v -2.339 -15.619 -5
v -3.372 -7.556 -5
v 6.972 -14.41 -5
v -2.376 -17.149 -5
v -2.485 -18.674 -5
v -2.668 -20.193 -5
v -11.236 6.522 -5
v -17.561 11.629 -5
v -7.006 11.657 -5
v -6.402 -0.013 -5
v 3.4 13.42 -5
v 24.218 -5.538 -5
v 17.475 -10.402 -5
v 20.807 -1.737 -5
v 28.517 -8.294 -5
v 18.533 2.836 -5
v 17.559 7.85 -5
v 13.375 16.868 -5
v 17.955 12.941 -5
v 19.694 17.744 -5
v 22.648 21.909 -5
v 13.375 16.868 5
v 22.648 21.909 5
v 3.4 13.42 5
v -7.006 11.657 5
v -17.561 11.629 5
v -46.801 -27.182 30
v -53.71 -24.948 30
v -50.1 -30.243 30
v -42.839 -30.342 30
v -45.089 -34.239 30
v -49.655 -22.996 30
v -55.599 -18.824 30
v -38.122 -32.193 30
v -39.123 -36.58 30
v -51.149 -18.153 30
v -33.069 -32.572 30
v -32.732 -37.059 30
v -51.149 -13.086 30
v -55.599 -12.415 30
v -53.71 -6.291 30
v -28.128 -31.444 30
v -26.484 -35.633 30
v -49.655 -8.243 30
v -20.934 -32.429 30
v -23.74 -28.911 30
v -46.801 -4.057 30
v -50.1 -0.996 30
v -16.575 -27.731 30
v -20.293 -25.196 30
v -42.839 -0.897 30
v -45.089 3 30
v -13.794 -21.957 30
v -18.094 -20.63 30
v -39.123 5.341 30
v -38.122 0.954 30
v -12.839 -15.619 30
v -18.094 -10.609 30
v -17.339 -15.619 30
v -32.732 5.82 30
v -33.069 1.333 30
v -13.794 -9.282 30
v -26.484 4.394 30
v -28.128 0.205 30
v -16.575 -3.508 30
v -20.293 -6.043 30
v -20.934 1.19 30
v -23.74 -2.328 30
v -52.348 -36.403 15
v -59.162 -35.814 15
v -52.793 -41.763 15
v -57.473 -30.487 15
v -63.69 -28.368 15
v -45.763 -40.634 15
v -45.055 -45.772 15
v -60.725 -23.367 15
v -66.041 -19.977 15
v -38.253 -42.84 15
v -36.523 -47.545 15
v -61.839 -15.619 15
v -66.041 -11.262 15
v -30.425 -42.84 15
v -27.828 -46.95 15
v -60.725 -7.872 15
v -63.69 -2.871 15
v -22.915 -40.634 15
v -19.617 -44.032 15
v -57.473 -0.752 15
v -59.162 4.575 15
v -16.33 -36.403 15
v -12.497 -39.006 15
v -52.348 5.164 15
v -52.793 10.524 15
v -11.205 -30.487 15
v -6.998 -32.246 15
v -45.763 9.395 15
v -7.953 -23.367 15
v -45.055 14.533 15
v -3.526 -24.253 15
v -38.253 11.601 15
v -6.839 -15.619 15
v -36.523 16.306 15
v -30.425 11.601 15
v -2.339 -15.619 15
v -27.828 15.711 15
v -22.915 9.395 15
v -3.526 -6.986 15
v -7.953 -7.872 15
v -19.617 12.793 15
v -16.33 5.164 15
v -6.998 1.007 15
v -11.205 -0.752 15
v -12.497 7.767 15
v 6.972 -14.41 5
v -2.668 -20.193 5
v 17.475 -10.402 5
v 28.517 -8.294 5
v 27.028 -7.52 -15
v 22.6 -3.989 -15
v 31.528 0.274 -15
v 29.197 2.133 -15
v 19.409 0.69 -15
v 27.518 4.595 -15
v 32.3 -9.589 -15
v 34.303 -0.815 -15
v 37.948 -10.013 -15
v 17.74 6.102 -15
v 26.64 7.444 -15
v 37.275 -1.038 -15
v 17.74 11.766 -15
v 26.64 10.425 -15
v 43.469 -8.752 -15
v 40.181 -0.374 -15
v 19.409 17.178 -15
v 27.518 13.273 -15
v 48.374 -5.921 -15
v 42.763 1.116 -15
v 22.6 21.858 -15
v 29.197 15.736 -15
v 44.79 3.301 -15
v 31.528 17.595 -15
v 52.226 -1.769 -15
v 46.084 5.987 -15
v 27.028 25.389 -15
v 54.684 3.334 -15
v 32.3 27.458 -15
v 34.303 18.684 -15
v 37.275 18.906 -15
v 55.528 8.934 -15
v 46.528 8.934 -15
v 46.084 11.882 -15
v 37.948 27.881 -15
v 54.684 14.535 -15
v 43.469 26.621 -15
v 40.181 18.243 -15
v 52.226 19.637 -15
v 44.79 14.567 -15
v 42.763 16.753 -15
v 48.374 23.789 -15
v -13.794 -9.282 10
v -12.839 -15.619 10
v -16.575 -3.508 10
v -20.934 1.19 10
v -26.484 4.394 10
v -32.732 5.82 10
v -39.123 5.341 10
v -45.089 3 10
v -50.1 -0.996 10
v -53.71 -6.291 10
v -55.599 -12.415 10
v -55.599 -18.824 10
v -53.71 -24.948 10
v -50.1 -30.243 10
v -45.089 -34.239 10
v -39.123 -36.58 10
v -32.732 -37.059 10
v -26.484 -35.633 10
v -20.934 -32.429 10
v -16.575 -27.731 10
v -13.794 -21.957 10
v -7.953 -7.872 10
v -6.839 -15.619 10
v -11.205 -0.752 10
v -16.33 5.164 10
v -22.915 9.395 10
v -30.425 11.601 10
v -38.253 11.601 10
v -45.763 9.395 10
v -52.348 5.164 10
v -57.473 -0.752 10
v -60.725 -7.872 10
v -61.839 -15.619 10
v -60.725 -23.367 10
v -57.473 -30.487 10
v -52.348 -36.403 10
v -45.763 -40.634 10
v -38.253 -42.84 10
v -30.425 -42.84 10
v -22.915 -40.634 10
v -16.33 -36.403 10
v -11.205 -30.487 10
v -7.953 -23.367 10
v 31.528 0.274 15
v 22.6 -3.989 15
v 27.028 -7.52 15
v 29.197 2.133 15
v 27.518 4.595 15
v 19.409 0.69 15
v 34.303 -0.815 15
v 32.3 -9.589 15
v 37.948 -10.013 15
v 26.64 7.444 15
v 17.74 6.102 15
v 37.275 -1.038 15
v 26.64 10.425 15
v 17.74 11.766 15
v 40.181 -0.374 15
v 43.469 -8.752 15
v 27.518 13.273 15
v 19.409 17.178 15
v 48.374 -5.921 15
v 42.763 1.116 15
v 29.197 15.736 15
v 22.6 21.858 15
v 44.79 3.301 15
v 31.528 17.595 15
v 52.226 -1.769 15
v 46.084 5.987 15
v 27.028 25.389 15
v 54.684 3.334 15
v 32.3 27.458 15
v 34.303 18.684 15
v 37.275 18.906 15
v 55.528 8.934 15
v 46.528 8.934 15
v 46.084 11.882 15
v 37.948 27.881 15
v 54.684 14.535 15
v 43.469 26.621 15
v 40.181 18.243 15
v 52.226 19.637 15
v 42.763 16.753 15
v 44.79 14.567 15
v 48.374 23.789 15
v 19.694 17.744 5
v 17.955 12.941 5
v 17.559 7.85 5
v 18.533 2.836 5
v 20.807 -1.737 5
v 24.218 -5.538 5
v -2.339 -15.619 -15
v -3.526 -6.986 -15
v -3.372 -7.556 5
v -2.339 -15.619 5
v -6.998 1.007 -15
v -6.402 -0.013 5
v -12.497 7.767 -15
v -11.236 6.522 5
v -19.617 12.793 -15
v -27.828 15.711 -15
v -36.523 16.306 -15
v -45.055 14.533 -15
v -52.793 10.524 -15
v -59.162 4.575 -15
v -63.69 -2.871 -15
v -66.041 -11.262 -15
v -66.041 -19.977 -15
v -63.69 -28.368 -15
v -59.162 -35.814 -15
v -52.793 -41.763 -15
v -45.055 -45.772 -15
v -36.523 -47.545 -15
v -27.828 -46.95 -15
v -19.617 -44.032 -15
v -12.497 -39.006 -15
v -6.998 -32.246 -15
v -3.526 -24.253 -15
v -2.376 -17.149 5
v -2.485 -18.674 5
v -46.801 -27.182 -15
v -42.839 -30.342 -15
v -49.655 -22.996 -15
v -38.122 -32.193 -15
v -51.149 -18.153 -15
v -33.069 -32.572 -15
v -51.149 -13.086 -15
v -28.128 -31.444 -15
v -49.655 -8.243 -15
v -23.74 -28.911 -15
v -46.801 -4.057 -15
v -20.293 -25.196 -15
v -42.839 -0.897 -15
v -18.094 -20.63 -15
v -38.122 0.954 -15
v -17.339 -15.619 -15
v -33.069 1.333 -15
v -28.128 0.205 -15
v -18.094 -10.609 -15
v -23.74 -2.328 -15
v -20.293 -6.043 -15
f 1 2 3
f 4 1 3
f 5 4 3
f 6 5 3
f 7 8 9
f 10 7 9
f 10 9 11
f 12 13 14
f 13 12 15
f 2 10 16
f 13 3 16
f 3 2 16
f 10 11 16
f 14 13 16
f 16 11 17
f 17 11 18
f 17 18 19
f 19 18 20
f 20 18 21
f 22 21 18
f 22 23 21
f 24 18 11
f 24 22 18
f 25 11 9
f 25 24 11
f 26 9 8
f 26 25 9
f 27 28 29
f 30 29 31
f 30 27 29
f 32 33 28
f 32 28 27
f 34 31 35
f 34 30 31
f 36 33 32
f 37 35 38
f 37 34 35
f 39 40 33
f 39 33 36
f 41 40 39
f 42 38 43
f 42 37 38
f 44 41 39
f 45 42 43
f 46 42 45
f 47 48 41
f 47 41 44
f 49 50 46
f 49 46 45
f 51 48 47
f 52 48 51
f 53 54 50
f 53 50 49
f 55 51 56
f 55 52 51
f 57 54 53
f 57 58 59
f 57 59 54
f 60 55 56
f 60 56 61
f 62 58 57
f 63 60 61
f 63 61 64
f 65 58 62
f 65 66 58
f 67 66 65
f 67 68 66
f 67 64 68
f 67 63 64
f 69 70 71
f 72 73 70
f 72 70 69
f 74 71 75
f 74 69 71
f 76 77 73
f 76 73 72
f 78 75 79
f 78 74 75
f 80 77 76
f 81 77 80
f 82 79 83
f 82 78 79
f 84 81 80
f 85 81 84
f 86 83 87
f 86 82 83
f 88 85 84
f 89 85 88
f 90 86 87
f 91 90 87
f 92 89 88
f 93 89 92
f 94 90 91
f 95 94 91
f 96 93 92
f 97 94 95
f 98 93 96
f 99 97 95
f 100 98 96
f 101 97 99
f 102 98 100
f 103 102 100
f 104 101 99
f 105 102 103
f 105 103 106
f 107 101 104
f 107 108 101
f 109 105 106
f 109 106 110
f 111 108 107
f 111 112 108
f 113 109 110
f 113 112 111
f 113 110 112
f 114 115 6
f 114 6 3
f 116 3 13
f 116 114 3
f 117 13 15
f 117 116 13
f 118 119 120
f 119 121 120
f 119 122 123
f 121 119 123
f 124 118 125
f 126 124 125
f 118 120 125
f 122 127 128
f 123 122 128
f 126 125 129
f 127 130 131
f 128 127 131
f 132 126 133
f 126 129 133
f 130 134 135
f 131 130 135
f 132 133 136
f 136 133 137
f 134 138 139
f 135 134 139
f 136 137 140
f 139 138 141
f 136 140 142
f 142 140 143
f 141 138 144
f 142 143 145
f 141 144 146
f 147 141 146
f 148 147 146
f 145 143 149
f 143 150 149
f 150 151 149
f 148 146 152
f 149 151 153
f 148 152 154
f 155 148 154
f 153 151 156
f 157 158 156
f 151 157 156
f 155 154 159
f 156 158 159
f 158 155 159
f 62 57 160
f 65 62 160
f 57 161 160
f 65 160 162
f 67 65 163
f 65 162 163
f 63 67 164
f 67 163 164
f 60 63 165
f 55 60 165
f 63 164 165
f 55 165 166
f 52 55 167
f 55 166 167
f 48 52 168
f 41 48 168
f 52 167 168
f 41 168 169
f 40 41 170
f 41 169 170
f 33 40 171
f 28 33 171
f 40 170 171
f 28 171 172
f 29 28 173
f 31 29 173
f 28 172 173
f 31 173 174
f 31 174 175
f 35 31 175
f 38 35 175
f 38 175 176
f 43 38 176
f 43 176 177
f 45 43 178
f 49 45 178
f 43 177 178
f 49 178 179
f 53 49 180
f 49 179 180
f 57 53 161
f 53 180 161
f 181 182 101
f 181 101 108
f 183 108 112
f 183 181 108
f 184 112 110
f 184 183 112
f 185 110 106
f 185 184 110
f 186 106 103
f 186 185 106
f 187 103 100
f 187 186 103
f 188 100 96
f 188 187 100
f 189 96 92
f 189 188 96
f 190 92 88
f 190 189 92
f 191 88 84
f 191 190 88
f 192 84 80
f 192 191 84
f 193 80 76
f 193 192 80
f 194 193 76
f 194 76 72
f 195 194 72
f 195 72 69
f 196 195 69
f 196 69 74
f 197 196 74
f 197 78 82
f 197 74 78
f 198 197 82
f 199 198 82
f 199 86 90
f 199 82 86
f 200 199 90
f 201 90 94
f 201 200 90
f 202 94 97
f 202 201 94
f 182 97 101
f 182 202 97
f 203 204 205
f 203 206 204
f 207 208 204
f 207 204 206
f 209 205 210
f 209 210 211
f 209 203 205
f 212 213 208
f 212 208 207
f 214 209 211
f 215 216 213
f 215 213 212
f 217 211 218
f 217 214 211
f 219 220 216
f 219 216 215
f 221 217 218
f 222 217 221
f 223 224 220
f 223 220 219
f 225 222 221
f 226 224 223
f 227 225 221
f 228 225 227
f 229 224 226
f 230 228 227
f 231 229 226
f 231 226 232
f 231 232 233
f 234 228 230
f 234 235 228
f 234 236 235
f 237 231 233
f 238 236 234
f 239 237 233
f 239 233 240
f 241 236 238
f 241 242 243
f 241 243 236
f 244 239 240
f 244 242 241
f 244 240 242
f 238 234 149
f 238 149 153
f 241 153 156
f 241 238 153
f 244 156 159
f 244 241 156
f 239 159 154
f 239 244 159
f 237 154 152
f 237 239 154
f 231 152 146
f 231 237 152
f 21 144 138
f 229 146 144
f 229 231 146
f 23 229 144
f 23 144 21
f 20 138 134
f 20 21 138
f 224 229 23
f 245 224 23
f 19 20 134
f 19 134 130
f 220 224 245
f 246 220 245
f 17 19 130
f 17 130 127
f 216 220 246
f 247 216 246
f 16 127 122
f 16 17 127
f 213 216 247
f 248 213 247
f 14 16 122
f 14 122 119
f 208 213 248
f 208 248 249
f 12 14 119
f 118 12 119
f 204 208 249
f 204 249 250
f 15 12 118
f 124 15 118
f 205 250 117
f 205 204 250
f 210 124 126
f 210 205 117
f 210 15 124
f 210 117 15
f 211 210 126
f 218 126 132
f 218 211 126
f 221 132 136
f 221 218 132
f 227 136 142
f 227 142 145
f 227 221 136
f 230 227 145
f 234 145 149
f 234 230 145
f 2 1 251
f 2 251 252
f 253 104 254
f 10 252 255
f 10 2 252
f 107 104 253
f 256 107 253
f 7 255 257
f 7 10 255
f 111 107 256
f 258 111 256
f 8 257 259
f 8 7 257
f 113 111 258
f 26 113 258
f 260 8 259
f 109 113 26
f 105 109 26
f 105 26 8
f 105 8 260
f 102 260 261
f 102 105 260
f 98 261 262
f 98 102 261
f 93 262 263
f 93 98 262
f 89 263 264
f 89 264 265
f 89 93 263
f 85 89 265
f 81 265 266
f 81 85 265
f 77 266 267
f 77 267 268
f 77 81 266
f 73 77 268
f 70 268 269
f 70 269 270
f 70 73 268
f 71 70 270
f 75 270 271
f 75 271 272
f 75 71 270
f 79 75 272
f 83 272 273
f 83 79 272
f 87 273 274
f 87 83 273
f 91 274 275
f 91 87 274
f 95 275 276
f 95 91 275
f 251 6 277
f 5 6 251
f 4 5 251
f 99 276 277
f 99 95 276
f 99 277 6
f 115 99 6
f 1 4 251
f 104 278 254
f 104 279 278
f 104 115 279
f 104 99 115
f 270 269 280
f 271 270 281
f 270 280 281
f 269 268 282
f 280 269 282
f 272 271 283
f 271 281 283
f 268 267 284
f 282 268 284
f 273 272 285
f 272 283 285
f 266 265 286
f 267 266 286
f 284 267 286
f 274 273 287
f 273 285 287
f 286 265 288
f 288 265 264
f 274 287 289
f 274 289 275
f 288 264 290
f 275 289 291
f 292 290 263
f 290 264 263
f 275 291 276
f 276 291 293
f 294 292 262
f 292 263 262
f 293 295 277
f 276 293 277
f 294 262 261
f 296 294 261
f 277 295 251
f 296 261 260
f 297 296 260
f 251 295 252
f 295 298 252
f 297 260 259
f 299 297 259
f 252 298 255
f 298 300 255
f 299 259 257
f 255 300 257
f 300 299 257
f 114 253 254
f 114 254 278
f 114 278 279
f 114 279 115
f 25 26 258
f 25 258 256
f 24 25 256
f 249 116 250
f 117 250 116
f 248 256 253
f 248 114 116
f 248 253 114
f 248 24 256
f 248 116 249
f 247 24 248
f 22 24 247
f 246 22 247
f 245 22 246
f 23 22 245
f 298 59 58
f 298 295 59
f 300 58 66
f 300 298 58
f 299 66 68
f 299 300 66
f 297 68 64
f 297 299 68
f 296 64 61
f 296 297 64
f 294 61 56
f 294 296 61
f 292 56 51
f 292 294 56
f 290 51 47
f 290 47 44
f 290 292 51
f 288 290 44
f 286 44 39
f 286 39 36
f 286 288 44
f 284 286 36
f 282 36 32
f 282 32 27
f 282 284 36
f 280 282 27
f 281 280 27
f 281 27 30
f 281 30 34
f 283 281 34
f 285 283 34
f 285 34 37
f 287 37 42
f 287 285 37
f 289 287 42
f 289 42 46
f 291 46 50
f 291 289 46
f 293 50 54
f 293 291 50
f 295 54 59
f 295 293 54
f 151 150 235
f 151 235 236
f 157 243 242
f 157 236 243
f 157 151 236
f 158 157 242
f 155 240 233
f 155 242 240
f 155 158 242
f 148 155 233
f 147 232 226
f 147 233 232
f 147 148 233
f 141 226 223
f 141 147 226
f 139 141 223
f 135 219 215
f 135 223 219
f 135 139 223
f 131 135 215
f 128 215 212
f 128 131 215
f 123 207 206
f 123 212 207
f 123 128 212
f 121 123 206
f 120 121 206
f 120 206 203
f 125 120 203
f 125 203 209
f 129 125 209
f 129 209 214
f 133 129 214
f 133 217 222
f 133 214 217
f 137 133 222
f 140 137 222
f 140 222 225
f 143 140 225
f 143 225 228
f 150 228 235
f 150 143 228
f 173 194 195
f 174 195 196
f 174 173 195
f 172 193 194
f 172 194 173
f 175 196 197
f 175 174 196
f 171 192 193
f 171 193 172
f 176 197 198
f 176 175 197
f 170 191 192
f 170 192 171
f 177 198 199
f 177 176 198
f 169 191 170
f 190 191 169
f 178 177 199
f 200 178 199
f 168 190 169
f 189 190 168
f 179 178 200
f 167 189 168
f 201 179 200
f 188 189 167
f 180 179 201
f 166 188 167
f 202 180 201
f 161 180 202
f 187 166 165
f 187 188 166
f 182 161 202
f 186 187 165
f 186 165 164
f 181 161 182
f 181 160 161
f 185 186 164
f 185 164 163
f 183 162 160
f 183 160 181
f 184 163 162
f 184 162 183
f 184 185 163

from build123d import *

# Parameters (mm, degrees)
SKETCH1_R               = 32
BOSS_EXTRUDE1_DEPTH     = 15
SKETCH1_R_2             = 19
BOSS_EXTRUDE1_2_DEPTH   = 15
BOSS_EXTRUDE2_DEPTH     = 5
CUT_EXTRUDE1_DEPTH      = 84.026980949
CUT_EXTRUDE1_DEPTH_BACK = 84.026980949
SKETCH1_4_R             = 17
SKETCH1_4_R_2           = 10
BOSS_EXTRUDE3_START     = 15
SKETCH1_5_R             = 21.5
SKETCH1_5_R_2           = 17
BOSS_EXTRUDE3_DEPTH     = 15
CUT_EXTRUDE2_DEPTH      = 87.997008946
CUT_EXTRUDE2_DEPTH_BACK = 5
CUT_EXTRUDE2_START      = 15
SKETCH1_6_R             = 27.5
SKETCH1_6_R_2           = 21.5


with BuildPart() as part:
    # Sketch1 → Boss-Extrude1 (new, symmetric)
    with BuildSketch(Plane.XY):
        with Locations((-34.339012541, -15.619481103)):
            Circle(SKETCH1_R)
    extrude(amount=BOSS_EXTRUDE1_DEPTH, both=True)



with BuildPart() as body_2:
    # Sketch1 → Boss-Extrude1 2 (new, symmetric)
    with BuildSketch(Plane.XY):
        with Locations((36.527862472, 8.934256411)):
            Circle(SKETCH1_R_2)
    extrude(amount=BOSS_EXTRUDE1_2_DEPTH, both=True)


with BuildPart() as part_1:
    add(part.part)

    add(body_2.part)  # Boss-Extrude2 merges body 2
    # Sketch1<3> → Boss-Extrude2 (add, symmetric)
    with BuildSketch(Plane.XY):
        with BuildLine():
            ThreePointArc((-17.560856981, 11.629252739), (-6.402468571, -0.013408214), (-2.339012541, -15.619481103))
            ThreePointArc((-2.339012541, -15.619481103), (-2.421245933, -17.912115996), (-2.667523463, -20.192967692))
            ThreePointArc((-2.667523463, -20.192967692), (12.135506322, -12.174986093), (28.517182449, -8.294469763))
            ThreePointArc((28.517182449, -8.294469763), (17.876719368, 5.310051543), (22.64811714, 21.909335198))
            ThreePointArc((22.64811714, 21.909335198), (3.400059206, 13.419502104), (-17.560856981, 11.629252739))
        make_face()
    extrude(amount=BOSS_EXTRUDE2_DEPTH, both=True)

    # Sketch1<4> → Cut-Extrude1 (cut, two sides: drawn at the far end of the back side and taken through both)
    with BuildSketch(Plane.XY.offset(-CUT_EXTRUDE1_DEPTH_BACK)):
        with Locations((-34.339012541, -15.619481103)):
            Circle(SKETCH1_4_R)
        with Locations((36.527862472, 8.934256411)):
            Circle(SKETCH1_4_R_2)
    extrude(amount=CUT_EXTRUDE1_DEPTH + CUT_EXTRUDE1_DEPTH_BACK, mode=Mode.SUBTRACT)

    # Sketch1<5> → Boss-Extrude3 (add)
    with BuildSketch(Plane.XY.offset(BOSS_EXTRUDE3_START)):
        with Locations((-34.339012541, -15.619481103)):
            Circle(SKETCH1_5_R)
        with Locations((-34.339012541, -15.619481103)):
            Circle(SKETCH1_5_R_2, mode=Mode.SUBTRACT)
    extrude(amount=BOSS_EXTRUDE3_DEPTH)

    # Sketch1<6> → Cut-Extrude2 (cut, two sides: drawn at the far end of the back side and taken through both)
    with BuildSketch(Plane.XY.offset(CUT_EXTRUDE2_START - CUT_EXTRUDE2_DEPTH_BACK)):
        with Locations((-34.339012541, -15.619481103)):
            Circle(SKETCH1_6_R)
        with Locations((-34.339012541, -15.619481103)):
            Circle(SKETCH1_6_R_2, mode=Mode.SUBTRACT)
    extrude(amount=CUT_EXTRUDE2_DEPTH + CUT_EXTRUDE2_DEPTH_BACK, mode=Mode.SUBTRACT)


solid = part_1.part
